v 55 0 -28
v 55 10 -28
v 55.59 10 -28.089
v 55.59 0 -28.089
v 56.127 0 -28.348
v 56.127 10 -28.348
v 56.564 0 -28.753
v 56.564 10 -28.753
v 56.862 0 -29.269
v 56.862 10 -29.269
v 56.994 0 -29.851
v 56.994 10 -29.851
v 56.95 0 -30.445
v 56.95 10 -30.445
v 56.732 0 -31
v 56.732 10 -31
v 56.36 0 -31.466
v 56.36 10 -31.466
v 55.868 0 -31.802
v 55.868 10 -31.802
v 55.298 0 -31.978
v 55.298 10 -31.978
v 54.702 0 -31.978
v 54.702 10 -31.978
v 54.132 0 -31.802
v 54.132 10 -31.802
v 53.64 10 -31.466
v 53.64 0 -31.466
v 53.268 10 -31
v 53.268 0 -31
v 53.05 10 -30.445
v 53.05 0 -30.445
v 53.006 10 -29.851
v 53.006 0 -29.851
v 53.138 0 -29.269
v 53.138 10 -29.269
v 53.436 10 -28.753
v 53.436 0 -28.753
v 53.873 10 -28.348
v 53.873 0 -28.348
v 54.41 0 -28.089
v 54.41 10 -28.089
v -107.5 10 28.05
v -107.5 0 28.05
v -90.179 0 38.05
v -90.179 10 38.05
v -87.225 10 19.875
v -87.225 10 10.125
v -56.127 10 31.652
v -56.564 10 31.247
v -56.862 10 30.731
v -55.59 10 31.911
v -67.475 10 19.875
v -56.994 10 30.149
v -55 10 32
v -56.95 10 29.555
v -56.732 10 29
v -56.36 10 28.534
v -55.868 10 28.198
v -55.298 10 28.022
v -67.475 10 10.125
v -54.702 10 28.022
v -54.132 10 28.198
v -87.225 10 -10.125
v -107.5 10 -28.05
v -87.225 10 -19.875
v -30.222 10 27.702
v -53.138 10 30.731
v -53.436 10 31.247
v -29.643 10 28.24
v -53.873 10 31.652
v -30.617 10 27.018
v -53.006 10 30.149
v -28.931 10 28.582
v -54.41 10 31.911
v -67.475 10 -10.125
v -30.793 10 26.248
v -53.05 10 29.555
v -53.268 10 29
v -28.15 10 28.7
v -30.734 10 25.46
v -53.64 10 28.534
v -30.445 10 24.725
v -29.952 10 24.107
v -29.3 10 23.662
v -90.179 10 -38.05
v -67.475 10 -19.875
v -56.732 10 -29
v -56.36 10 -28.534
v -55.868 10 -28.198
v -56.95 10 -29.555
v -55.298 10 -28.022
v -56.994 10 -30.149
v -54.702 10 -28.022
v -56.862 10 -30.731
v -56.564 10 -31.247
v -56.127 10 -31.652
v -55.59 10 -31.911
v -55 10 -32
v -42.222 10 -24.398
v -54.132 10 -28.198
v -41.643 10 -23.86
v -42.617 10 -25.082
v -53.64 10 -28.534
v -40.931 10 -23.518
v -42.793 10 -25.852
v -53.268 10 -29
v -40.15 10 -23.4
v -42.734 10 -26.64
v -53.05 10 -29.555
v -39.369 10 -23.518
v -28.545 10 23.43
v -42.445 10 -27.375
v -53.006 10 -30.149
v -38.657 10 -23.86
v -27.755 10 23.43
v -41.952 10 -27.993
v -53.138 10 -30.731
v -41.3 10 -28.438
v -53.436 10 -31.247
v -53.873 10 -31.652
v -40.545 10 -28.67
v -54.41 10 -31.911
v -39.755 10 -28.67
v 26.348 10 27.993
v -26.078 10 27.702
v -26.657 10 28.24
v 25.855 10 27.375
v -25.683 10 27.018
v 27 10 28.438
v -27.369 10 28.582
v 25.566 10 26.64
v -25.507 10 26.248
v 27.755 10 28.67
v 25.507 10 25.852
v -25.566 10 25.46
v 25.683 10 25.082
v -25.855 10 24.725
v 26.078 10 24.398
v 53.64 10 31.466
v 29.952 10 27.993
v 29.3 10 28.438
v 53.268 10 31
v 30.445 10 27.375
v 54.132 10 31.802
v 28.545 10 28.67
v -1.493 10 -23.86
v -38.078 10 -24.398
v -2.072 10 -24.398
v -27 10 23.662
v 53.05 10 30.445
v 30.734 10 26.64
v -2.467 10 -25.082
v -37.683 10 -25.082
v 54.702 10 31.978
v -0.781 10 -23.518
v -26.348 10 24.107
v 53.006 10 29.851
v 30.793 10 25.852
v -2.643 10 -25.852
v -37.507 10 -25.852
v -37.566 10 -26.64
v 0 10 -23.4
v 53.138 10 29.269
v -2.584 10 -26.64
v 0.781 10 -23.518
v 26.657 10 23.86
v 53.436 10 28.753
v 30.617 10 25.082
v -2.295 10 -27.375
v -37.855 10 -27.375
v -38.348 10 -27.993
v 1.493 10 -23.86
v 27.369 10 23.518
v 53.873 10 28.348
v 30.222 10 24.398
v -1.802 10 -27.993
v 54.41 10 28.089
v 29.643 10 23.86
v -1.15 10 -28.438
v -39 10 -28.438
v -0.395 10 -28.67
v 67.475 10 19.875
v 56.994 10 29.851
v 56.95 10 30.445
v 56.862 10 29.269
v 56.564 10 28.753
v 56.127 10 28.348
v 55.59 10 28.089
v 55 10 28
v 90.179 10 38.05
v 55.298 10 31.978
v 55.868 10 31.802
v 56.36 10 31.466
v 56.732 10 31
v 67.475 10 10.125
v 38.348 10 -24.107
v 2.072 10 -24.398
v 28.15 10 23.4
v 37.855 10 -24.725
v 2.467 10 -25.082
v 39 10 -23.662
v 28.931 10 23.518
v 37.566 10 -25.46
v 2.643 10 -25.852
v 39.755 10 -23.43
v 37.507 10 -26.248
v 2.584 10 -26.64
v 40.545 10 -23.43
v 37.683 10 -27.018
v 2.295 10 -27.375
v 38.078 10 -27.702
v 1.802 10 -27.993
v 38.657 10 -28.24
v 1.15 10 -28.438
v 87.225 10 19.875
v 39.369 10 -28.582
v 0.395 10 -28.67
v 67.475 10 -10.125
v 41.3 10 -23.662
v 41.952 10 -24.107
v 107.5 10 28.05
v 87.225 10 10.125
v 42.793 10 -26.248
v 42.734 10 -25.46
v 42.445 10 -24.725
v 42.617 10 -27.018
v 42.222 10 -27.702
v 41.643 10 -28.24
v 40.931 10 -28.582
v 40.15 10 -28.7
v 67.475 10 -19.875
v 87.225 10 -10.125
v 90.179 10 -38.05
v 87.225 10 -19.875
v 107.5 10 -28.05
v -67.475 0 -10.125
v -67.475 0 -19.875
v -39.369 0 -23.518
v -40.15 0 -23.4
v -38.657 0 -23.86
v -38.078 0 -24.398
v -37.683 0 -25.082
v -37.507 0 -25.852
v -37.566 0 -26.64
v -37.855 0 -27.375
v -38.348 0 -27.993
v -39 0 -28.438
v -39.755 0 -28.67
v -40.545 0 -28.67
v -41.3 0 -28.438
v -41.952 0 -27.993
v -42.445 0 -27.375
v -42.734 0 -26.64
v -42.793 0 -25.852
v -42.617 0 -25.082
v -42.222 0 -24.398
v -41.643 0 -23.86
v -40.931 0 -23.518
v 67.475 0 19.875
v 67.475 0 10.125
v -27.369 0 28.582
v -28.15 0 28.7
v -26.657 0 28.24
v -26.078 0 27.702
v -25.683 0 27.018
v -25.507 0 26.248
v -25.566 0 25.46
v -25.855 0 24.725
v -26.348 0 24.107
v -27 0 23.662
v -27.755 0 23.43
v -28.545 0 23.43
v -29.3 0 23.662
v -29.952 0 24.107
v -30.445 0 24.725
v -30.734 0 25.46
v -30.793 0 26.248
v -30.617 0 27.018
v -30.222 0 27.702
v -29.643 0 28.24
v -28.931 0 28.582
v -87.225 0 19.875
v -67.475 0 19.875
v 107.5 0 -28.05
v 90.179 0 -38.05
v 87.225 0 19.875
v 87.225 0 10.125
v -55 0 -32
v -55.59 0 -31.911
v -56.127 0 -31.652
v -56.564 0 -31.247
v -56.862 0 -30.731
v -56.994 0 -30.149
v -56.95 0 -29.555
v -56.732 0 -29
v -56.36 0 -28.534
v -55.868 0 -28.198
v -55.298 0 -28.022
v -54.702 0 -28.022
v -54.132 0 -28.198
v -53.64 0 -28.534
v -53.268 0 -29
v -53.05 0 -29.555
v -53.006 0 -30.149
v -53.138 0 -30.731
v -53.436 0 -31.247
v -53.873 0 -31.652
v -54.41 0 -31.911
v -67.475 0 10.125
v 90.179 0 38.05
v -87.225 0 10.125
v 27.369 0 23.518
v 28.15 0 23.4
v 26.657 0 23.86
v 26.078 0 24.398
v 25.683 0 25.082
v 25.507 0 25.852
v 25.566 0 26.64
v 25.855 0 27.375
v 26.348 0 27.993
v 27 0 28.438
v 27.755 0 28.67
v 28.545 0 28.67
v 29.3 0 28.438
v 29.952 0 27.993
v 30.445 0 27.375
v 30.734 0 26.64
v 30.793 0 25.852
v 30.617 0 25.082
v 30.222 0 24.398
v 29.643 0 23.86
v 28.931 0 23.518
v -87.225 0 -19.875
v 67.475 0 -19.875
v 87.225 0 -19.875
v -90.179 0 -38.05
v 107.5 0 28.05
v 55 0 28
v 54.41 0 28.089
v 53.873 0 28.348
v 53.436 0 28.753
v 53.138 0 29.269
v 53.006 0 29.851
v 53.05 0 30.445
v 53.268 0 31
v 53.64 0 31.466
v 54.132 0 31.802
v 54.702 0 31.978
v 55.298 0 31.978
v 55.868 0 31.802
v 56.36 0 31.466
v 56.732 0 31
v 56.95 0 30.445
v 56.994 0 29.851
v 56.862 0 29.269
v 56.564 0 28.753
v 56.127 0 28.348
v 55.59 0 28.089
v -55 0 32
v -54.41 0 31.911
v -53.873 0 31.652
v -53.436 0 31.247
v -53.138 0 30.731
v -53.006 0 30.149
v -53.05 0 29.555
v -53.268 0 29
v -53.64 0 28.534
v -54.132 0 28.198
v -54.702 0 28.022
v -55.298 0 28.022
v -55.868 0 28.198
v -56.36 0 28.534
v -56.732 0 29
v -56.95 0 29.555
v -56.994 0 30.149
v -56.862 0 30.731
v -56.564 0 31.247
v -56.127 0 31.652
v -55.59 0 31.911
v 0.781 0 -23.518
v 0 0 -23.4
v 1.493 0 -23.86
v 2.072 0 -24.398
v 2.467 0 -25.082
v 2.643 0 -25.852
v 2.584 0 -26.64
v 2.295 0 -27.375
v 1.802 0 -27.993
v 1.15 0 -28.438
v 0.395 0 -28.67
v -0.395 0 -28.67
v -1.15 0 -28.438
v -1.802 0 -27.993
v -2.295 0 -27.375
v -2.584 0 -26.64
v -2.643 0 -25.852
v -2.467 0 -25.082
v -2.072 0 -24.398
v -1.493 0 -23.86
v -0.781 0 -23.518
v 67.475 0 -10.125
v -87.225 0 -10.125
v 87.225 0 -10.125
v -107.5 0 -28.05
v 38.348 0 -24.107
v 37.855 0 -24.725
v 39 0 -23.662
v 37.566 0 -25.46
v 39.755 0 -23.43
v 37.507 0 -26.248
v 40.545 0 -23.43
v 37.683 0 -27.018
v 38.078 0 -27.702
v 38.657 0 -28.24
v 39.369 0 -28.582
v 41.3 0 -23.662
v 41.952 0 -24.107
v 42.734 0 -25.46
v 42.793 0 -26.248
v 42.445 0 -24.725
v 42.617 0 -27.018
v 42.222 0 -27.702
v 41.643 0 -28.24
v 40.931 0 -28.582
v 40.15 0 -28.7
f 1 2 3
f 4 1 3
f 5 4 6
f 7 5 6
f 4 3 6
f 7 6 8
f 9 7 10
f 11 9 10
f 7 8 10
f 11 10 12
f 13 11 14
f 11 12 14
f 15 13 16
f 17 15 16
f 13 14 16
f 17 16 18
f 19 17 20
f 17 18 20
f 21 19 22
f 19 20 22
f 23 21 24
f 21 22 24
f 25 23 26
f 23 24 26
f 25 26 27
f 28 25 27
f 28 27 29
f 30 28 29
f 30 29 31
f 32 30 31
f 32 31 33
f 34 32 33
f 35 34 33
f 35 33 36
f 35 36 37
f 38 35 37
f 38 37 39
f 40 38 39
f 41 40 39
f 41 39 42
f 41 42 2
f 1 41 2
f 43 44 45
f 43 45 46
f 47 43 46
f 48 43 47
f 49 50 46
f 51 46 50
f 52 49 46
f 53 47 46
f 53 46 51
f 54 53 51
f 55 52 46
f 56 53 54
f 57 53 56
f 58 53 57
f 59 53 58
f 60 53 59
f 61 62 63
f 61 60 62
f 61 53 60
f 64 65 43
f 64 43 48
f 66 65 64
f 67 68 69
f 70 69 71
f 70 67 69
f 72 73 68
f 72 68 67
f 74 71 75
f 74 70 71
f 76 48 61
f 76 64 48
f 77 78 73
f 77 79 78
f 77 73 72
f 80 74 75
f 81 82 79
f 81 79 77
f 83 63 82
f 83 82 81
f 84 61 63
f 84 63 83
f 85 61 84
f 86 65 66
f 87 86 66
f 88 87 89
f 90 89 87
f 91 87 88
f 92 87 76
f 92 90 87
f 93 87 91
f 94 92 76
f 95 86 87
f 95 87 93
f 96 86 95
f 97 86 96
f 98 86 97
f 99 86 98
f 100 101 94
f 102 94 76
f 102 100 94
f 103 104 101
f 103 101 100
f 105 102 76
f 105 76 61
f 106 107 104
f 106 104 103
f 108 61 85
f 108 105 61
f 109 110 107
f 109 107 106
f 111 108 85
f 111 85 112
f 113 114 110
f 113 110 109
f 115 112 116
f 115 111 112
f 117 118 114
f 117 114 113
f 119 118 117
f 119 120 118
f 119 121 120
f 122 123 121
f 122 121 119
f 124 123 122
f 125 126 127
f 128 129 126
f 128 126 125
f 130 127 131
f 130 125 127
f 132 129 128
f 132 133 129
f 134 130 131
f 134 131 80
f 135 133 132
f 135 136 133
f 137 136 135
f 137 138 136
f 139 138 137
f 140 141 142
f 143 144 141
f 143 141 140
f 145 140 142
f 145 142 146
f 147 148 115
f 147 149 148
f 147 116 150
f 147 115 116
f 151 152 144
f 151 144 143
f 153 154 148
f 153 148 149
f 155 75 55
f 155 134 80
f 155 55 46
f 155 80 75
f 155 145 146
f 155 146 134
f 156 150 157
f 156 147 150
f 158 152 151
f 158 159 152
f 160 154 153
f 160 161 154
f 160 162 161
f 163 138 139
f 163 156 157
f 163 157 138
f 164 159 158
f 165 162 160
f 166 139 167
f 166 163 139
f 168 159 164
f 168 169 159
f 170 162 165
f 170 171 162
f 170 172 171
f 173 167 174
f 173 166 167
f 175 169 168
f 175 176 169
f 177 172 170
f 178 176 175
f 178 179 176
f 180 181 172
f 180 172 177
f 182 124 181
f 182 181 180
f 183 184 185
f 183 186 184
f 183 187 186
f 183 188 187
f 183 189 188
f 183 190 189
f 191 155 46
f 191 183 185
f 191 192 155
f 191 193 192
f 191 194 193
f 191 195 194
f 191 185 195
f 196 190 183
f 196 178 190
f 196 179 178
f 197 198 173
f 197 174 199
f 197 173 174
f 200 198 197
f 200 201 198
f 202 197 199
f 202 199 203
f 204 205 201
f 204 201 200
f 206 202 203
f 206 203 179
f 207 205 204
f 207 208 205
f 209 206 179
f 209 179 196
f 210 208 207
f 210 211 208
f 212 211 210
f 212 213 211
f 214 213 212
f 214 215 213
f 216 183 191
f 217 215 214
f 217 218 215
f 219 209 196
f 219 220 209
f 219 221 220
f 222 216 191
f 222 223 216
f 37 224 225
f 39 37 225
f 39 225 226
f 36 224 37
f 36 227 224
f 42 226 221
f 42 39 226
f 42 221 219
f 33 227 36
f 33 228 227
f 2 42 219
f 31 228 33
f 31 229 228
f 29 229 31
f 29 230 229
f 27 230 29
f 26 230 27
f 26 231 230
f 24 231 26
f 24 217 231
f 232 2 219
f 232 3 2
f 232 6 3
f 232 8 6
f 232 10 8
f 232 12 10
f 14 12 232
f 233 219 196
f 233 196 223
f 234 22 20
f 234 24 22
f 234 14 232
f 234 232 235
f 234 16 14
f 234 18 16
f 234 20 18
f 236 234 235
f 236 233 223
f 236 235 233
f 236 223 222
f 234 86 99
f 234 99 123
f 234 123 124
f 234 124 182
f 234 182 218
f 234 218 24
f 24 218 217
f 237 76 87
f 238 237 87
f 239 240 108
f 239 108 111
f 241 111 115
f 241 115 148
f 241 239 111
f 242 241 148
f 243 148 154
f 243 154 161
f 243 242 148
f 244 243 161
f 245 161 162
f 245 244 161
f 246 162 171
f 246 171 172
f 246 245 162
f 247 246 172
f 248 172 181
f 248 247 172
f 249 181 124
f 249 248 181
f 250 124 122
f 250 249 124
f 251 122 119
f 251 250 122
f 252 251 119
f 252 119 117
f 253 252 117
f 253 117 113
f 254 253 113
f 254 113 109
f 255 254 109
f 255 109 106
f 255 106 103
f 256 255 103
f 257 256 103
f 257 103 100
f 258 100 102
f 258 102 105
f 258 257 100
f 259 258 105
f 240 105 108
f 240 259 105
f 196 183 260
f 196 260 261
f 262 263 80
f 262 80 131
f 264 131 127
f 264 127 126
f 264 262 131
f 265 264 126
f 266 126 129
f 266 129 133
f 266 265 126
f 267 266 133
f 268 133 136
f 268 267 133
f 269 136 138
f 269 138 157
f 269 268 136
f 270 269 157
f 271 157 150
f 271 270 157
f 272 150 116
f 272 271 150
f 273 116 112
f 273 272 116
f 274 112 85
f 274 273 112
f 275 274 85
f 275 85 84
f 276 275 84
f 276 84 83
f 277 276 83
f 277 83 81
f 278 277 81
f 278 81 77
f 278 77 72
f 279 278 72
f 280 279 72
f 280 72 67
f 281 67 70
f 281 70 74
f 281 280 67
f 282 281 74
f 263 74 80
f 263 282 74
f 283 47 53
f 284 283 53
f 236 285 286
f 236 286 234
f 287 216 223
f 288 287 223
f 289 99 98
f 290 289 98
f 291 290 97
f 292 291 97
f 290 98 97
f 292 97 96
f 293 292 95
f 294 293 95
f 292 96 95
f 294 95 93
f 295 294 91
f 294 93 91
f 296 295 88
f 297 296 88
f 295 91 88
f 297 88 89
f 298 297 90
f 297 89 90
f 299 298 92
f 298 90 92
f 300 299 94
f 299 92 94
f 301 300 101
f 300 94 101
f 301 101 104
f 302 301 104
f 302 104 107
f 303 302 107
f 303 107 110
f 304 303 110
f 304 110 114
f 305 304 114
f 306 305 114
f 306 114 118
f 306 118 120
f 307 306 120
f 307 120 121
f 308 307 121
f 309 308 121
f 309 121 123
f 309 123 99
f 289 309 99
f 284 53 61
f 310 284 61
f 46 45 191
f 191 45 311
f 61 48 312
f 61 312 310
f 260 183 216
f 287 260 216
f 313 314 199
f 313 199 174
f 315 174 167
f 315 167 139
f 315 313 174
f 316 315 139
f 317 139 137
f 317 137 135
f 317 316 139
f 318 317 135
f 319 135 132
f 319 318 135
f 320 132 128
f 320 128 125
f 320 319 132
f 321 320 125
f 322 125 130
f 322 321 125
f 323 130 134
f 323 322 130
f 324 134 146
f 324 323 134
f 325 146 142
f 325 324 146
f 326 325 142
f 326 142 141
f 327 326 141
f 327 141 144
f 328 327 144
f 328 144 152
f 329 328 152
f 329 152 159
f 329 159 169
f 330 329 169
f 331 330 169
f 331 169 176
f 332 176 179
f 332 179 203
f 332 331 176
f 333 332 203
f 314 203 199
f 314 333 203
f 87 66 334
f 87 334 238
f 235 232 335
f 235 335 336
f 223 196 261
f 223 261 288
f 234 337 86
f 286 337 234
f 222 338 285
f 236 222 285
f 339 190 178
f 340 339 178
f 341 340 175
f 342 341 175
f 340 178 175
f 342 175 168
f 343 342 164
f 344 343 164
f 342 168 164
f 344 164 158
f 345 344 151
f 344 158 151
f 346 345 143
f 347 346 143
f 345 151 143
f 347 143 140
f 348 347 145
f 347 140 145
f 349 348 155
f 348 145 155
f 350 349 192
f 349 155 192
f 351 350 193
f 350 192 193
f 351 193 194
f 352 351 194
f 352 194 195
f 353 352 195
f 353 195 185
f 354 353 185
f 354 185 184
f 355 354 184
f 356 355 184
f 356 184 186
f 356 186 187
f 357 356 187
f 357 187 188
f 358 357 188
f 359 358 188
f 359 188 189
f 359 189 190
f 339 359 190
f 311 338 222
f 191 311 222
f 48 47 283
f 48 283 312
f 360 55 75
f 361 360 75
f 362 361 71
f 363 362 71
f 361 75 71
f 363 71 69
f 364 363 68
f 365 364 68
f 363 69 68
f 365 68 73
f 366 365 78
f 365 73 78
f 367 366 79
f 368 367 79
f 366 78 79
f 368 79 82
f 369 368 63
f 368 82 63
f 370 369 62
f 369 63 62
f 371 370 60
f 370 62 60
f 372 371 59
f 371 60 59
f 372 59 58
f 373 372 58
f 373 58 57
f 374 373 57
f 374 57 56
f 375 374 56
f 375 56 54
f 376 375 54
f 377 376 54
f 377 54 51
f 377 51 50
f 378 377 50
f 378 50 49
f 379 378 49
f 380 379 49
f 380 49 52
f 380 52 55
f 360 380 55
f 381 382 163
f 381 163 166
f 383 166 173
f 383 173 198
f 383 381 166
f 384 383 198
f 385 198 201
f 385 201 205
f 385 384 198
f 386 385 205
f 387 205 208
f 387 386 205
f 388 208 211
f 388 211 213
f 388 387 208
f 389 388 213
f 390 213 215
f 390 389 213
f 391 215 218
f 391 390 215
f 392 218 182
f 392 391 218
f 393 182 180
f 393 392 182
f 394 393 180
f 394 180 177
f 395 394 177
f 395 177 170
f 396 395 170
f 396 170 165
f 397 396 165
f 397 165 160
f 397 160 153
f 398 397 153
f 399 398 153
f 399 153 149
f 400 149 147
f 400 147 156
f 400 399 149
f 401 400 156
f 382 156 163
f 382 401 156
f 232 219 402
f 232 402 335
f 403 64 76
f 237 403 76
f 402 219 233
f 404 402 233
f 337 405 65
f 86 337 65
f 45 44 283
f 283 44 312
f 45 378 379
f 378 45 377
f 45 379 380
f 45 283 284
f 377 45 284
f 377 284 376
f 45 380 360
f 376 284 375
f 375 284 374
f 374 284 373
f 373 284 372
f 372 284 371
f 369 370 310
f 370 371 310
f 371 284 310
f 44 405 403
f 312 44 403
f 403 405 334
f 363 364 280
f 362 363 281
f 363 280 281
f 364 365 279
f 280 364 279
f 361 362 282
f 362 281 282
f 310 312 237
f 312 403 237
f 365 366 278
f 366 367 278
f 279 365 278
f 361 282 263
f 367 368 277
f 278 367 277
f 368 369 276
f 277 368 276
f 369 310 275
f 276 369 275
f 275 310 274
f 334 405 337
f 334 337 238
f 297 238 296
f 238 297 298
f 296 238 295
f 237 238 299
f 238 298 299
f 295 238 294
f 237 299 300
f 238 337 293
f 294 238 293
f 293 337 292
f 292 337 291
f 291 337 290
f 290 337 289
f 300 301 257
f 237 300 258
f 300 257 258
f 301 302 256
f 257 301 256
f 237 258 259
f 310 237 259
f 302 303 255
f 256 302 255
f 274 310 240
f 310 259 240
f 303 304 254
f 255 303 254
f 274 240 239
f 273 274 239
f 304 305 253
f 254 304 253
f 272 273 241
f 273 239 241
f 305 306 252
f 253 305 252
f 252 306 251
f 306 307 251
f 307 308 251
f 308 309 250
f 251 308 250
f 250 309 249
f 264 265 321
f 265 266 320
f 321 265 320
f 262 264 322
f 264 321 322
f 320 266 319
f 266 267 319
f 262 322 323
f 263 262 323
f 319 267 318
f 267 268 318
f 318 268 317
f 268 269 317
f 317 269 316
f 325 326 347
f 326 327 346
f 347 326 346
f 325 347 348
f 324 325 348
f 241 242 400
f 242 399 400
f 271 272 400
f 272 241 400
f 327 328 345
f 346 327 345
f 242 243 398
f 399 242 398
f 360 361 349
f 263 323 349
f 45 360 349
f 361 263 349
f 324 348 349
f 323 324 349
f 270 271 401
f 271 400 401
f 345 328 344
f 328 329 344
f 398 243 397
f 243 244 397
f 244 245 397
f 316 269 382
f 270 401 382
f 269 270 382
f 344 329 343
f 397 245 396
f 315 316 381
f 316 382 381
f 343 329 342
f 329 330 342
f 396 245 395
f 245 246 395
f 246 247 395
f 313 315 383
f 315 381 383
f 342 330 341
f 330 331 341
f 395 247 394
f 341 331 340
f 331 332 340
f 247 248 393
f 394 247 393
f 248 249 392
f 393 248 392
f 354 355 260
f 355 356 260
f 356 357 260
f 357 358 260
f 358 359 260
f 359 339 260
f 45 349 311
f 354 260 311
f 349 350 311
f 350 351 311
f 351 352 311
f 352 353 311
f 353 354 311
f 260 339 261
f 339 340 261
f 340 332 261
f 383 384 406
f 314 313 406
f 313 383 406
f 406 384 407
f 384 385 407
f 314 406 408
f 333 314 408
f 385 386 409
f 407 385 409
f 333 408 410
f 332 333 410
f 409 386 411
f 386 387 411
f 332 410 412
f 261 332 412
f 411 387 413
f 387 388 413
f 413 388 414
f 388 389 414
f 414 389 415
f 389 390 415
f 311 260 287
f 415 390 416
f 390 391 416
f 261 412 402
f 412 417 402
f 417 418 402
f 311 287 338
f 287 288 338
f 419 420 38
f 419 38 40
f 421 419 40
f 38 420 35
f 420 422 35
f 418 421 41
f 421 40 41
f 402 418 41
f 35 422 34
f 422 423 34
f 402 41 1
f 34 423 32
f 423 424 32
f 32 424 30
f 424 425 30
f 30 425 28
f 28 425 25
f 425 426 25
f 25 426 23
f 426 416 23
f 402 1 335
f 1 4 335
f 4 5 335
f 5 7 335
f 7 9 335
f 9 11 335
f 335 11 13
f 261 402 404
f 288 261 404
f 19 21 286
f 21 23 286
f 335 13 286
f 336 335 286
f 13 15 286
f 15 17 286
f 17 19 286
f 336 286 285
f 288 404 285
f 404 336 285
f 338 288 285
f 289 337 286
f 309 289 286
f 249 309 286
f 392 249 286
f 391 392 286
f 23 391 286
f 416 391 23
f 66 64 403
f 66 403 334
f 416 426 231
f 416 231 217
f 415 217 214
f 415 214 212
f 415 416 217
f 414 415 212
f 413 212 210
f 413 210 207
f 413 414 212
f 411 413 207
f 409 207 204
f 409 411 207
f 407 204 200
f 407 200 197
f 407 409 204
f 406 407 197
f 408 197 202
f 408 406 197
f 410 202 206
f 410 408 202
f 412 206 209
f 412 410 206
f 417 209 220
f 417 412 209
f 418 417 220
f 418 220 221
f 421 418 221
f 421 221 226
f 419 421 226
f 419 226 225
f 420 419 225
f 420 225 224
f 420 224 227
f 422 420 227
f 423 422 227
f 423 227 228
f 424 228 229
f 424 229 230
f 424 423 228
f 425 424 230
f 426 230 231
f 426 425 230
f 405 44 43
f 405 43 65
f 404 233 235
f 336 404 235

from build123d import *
from OCP.BRepFilletAPI import BRepFilletAPI_MakeChamfer

# Parameters (mm, degrees)
SKETCH1_W           = 215
SKETCH1_H           = 76.1
SKETCH1_R           = 2.65
BOSS_EXTRUDE1_DEPTH = 10
SKETCH2_W           = 19.75
SKETCH2_H           = 9.75
CUT_EXTRUDE1_DEPTH  = 115.472933482
CHAMFER1_SIZE       = 10
CHAMFER1_SIZE2      = 17.320508076
SKETCH3_R           = 2
CUT_EXTRUDE2_DEPTH  = 115.472933482


with BuildPart() as part:
    # Sketch1 → Boss-Extrude1 (new body)
    with BuildSketch(Plane(origin=(0, 0, 0), x_dir=(1, 0, 0), z_dir=(0, 1, 0))):
        Rectangle(SKETCH1_W, SKETCH1_H)
        with Locations(Location((-40.15, 26.05, 0), (0, 0, 270))):
            Circle(SKETCH1_R, mode=Mode.SUBTRACT)
        with Locations(Location((40.15, 26.05, 0), (0, 0, 90))):
            Circle(SKETCH1_R, mode=Mode.SUBTRACT)
        with Locations(Location((0, 26.05, 0), (0, 0, 270))):
            Circle(SKETCH1_R, mode=Mode.SUBTRACT)
        with Locations(Location((-28.15, -26.05, 0), (0, 0, 270))):
            Circle(SKETCH1_R, mode=Mode.SUBTRACT)
        with Locations(Location((28.15, -26.05, 0), (0, 0, 90))):
            Circle(SKETCH1_R, mode=Mode.SUBTRACT)
    extrude(amount=BOSS_EXTRUDE1_DEPTH)

    # Sketch2 → Cut-Extrude1 (cut, through all)
    with BuildSketch(Plane(origin=(0, 10, 0), x_dir=(1, 0, 0), z_dir=(0, 1, 0))):
        with Locations((-77.35, -15)):
            Rectangle(SKETCH2_W, SKETCH2_H)
        with Locations((-77.35, 15)):
            Rectangle(SKETCH2_W, SKETCH2_H)
        with Locations((77.35, 15)):
            Rectangle(SKETCH2_W, SKETCH2_H)
        with Locations((77.35, -15)):
            Rectangle(SKETCH2_W, SKETCH2_H)
    extrude(amount=-CUT_EXTRUDE1_DEPTH, mode=Mode.SUBTRACT)

    # Chamfer1: one chamfer whose edges measure the first distance from different faces: ONE call of the kernel's chamfer builder (chamfer() names one face for all edges)
    chamfer1_edges_1 = [part.edges().sort_by_distance(p)[0] for p in [
        (-107.5, 5, -38.05),
        (-107.5, 5, 38.05),
    ]]
    chamfer1_side_1 = [part.faces().sort_by_distance(p)[0] for p in [
        (-107.5, 5, 0),
    ]]
    chamfer1_edges_2 = [part.edges().sort_by_distance(p)[0] for p in [
        (107.5, 5, -38.05),
        (107.5, 5, 38.05),
    ]]
    chamfer1_side_2 = [part.faces().sort_by_distance(p)[0] for p in [
        (107.5, 5, 0),
    ]]
    chamfer1 = BRepFilletAPI_MakeChamfer(part.part.solid().wrapped)
    for e in chamfer1_edges_1:
        chamfer1.Add(CHAMFER1_SIZE, CHAMFER1_SIZE2, e.wrapped, chamfer1_side_1[0].wrapped)  # the first distance lies on this face
    for e in chamfer1_edges_2:
        chamfer1.Add(CHAMFER1_SIZE, CHAMFER1_SIZE2, e.wrapped, chamfer1_side_2[0].wrapped)  # the first distance lies on this face
    add(Compound.cast(chamfer1.Shape()), mode=Mode.REPLACE)

    # Sketch3 → Cut-Extrude2 (cut, through all)
    with BuildSketch(Plane(origin=(0, 10, 0), x_dir=(1, 0, 0), z_dir=(0, 1, 0))):
        with Locations(Location((-55, -30, 0), (0, 0, 270))):
            Circle(SKETCH3_R)
        with Locations(Location((-55, 30, 0), (0, 0, 90))):
            Circle(SKETCH3_R)
        with Locations(Location((55, -30, 0), (0, 0, 90))):
            Circle(SKETCH3_R)
        with Locations(Location((55, 30, 0), (0, 0, 270))):
            Circle(SKETCH3_R)
    extrude(amount=-CUT_EXTRUDE2_DEPTH, mode=Mode.SUBTRACT)


solid = part.part
